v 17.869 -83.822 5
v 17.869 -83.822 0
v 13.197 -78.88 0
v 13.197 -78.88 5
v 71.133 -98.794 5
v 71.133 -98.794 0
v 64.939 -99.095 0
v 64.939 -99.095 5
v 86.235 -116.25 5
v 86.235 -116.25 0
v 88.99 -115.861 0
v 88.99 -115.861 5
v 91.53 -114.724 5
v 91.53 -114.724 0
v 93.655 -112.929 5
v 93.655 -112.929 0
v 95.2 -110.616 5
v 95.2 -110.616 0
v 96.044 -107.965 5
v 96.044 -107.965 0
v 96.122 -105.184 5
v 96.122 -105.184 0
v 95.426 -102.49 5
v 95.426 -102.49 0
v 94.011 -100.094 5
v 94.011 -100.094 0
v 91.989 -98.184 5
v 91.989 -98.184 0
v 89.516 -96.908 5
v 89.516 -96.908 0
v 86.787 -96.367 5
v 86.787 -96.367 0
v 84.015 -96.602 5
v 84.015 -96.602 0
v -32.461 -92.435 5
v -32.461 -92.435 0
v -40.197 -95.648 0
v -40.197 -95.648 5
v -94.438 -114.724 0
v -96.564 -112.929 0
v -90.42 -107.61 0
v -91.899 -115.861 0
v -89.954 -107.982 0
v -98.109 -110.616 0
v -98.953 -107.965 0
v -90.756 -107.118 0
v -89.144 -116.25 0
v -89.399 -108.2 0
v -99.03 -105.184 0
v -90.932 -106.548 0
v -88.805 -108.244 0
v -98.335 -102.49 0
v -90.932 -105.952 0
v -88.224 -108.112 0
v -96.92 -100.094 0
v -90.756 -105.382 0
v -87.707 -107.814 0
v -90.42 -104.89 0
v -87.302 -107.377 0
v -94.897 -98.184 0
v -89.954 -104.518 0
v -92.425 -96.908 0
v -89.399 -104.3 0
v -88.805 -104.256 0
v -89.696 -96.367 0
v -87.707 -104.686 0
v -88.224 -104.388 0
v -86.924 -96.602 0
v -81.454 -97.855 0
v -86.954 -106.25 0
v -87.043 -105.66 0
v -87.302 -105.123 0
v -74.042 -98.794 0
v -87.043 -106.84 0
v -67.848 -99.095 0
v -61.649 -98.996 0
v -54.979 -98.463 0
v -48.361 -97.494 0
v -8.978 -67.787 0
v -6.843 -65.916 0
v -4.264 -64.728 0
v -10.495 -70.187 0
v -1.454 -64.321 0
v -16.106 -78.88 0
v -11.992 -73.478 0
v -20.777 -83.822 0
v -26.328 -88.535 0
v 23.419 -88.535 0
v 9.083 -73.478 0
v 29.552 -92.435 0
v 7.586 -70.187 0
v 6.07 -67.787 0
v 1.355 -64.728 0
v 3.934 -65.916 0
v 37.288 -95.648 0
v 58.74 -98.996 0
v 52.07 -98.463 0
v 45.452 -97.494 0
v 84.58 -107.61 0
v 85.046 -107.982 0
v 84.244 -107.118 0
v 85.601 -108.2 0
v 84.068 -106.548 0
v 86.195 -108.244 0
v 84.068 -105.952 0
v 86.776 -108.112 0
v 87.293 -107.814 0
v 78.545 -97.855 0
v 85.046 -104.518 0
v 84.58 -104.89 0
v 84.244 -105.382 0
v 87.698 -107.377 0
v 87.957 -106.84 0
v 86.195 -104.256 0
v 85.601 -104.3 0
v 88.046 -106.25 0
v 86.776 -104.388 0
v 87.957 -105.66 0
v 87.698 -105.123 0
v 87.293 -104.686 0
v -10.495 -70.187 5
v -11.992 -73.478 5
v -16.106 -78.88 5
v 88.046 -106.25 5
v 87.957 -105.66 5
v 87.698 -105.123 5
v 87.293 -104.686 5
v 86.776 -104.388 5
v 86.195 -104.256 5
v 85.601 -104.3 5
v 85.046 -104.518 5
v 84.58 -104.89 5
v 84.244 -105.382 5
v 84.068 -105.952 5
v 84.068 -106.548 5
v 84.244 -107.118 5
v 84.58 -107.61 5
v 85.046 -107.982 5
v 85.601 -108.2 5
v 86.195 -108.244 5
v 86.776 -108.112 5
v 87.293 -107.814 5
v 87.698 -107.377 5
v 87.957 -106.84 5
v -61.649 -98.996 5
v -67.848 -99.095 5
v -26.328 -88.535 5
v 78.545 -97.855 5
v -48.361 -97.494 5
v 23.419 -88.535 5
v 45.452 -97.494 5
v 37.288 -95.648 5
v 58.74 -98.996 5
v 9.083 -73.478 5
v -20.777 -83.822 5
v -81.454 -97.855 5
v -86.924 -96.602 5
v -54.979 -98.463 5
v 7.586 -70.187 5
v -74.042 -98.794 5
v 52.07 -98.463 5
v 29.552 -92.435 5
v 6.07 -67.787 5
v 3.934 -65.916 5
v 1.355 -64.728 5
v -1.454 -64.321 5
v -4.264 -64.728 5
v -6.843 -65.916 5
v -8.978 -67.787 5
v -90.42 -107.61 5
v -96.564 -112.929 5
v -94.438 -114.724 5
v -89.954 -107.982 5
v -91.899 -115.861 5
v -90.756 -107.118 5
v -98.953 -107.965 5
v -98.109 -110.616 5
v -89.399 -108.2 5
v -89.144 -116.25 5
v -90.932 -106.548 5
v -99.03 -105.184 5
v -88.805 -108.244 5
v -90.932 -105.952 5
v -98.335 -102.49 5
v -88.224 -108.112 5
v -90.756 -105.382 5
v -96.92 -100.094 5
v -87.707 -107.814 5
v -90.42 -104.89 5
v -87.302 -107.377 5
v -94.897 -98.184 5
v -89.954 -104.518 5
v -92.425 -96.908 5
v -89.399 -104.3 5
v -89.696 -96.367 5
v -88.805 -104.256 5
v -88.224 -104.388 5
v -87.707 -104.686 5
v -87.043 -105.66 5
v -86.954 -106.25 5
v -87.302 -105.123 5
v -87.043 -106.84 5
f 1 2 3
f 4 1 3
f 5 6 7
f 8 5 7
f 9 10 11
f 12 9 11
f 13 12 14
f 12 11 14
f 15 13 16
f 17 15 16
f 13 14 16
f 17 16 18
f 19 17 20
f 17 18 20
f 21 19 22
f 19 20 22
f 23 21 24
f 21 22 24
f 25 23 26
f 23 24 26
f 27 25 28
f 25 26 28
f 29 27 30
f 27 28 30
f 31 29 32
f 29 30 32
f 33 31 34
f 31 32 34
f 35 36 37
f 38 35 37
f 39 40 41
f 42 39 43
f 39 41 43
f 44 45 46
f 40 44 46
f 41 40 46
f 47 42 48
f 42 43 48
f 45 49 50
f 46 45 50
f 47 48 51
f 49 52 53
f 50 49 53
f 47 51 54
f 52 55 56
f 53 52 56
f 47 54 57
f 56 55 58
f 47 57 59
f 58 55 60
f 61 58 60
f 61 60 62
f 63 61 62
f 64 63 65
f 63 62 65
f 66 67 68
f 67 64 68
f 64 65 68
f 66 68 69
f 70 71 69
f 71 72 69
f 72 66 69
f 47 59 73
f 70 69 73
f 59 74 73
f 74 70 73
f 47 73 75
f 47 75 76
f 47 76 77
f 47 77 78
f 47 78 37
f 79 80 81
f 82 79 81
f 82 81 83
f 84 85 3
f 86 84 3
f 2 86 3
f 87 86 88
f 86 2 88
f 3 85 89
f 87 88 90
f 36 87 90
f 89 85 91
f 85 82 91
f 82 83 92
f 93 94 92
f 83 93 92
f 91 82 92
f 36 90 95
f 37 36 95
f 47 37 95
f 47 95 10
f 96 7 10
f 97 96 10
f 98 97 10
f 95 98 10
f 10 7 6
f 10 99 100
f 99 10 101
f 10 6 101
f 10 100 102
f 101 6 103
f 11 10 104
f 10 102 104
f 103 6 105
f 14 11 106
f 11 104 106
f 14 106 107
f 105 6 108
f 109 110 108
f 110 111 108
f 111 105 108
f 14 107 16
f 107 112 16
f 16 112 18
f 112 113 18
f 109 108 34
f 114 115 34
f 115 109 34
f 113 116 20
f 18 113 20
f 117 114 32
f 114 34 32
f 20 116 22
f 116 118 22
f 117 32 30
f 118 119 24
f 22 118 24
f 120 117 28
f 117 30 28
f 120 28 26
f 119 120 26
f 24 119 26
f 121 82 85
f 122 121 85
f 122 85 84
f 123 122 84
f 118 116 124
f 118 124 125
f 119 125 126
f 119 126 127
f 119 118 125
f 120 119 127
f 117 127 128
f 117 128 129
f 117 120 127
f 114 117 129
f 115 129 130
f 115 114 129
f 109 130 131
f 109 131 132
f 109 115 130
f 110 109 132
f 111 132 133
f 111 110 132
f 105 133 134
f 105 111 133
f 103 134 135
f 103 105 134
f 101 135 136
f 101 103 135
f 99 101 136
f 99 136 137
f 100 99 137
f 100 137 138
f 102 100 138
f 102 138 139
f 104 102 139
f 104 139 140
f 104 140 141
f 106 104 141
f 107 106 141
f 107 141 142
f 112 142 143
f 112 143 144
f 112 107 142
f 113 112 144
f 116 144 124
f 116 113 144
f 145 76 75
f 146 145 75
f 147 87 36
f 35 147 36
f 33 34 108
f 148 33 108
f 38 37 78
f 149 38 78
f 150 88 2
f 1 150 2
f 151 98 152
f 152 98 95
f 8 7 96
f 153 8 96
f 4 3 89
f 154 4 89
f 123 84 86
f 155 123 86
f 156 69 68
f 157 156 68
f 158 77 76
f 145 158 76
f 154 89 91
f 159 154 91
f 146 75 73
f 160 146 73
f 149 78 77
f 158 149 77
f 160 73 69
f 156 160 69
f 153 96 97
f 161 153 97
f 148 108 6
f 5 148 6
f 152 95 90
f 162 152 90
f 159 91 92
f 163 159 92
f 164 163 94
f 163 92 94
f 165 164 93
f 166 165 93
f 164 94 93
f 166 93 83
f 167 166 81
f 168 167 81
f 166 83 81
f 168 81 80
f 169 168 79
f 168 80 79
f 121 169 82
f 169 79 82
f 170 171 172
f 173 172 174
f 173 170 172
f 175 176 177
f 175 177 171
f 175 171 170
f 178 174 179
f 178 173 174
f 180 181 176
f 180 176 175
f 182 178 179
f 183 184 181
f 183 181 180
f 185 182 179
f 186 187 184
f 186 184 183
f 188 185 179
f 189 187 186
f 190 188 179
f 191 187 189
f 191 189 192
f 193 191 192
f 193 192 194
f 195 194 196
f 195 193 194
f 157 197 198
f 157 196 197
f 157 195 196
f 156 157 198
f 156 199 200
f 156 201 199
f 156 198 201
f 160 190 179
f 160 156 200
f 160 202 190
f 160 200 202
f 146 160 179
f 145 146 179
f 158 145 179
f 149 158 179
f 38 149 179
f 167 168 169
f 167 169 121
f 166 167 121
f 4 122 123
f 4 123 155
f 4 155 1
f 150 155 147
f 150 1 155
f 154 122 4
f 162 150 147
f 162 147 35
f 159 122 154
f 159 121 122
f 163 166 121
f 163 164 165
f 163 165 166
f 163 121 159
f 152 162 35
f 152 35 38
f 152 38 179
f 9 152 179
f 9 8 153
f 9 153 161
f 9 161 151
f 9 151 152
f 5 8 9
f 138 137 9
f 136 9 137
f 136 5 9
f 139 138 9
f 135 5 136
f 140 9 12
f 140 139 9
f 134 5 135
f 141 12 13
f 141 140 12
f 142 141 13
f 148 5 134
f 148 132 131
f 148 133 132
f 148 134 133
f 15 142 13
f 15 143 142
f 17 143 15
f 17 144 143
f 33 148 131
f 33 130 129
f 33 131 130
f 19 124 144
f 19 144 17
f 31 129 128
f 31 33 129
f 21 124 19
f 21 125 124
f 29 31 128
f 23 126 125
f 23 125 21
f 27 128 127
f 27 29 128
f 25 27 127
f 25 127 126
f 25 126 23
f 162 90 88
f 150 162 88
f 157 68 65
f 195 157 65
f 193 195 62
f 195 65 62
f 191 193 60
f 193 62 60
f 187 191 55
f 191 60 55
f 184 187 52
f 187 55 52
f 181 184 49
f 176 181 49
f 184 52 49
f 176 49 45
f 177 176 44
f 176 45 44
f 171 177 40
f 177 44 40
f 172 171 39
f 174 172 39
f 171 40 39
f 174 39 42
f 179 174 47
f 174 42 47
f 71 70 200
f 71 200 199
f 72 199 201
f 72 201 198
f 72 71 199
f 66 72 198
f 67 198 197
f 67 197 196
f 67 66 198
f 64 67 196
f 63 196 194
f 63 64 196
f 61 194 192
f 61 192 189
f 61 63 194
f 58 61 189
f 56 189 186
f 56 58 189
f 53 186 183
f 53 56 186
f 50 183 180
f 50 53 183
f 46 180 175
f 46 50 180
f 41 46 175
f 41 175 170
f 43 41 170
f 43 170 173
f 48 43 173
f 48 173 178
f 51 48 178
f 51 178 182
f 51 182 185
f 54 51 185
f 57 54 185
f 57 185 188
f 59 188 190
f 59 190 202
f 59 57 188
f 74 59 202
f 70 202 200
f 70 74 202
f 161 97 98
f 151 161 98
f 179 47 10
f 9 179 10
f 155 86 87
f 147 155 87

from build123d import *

# Parameters (mm, degrees)
F0_R     = 2
F1_DEPTH = 5


# Not quite as in the source:
# - ends of sketch curves that miss each other by under 0.0002 mm in the source are joined


with BuildPart() as f1:
    # F0 (on Top) → F1 (new body)
    with BuildSketch(Plane.XY):
        with BuildLine():
            ThreePointArc((-86.9239089763, -96.6023878966), (-99.0303580955, -105.1836331247), (-89.144034, -116.25))
            Line((-89.144034, -116.25), (86.235345, -116.25))
            ThreePointArc((86.235345, -116.25), (96.1216690408, -105.1836326404), (84.0152190261, -96.6023881141))
            Line((84.0152190261, -96.6023881141), (78.54514, -97.854584))
            Line((78.54514, -97.854584), (71.133383, -98.793694))
            Line((71.133383, -98.793694), (64.939287, -99.095039))
            Line((64.939287, -99.095039), (58.739872, -98.995936))
            Line((58.739872, -98.995936), (52.07042, -98.463421))
            Line((52.07042, -98.463421), (45.452353, -97.494386))
            Line((45.452353, -97.494386), (37.288225, -95.647643))
            Line((37.288225, -95.647643), (29.552302, -92.435031))
            Line((29.552302, -92.435031), (23.41918, -88.534685))
            Line((23.41918, -88.534685), (17.86875, -83.821678))
            Line((17.86875, -83.821678), (13.197325, -78.879824))
            Line((13.197325, -78.879824), (9.083287, -73.477642))
            Line((9.083287, -73.477642), (7.586324, -70.18701))
            ThreePointArc((7.586324, -70.18701), (-1.454345, -64.321401), (-10.4950136906, -70.1870101381))
            Line((-10.4950136906, -70.1870101381), (-11.991976, -73.477642))
            Line((-11.991976, -73.477642), (-16.106015, -78.879824))
            Line((-16.106015, -78.879824), (-20.77744, -83.821678))
            Line((-20.77744, -83.821678), (-26.32787, -88.534685))
            Line((-26.32787, -88.534685), (-32.460992, -92.435031))
            Line((-32.460992, -92.435031), (-40.196915, -95.647643))
            Line((-40.196915, -95.647643), (-48.361042, -97.494386))
            Line((-48.361042, -97.494386), (-54.979109, -98.463421))
            Line((-54.979109, -98.463421), (-61.648561, -98.995936))
            Line((-61.648561, -98.995936), (-67.847977, -99.095039))
            Line((-67.847977, -99.095039), (-74.042073, -98.793694))
            Line((-74.042073, -98.793694), (-81.45383, -97.854584))
            Line((-81.45383, -97.854584), (-86.9239089763, -96.6023878966))
        make_face()
        with Locations((-88.954345, -106.25)):
            Circle(F0_R, mode=Mode.SUBTRACT)
        with Locations((86.045655, -106.25)):
            Circle(F0_R, mode=Mode.SUBTRACT)
    extrude(amount=F1_DEPTH)


solid = f1.part
